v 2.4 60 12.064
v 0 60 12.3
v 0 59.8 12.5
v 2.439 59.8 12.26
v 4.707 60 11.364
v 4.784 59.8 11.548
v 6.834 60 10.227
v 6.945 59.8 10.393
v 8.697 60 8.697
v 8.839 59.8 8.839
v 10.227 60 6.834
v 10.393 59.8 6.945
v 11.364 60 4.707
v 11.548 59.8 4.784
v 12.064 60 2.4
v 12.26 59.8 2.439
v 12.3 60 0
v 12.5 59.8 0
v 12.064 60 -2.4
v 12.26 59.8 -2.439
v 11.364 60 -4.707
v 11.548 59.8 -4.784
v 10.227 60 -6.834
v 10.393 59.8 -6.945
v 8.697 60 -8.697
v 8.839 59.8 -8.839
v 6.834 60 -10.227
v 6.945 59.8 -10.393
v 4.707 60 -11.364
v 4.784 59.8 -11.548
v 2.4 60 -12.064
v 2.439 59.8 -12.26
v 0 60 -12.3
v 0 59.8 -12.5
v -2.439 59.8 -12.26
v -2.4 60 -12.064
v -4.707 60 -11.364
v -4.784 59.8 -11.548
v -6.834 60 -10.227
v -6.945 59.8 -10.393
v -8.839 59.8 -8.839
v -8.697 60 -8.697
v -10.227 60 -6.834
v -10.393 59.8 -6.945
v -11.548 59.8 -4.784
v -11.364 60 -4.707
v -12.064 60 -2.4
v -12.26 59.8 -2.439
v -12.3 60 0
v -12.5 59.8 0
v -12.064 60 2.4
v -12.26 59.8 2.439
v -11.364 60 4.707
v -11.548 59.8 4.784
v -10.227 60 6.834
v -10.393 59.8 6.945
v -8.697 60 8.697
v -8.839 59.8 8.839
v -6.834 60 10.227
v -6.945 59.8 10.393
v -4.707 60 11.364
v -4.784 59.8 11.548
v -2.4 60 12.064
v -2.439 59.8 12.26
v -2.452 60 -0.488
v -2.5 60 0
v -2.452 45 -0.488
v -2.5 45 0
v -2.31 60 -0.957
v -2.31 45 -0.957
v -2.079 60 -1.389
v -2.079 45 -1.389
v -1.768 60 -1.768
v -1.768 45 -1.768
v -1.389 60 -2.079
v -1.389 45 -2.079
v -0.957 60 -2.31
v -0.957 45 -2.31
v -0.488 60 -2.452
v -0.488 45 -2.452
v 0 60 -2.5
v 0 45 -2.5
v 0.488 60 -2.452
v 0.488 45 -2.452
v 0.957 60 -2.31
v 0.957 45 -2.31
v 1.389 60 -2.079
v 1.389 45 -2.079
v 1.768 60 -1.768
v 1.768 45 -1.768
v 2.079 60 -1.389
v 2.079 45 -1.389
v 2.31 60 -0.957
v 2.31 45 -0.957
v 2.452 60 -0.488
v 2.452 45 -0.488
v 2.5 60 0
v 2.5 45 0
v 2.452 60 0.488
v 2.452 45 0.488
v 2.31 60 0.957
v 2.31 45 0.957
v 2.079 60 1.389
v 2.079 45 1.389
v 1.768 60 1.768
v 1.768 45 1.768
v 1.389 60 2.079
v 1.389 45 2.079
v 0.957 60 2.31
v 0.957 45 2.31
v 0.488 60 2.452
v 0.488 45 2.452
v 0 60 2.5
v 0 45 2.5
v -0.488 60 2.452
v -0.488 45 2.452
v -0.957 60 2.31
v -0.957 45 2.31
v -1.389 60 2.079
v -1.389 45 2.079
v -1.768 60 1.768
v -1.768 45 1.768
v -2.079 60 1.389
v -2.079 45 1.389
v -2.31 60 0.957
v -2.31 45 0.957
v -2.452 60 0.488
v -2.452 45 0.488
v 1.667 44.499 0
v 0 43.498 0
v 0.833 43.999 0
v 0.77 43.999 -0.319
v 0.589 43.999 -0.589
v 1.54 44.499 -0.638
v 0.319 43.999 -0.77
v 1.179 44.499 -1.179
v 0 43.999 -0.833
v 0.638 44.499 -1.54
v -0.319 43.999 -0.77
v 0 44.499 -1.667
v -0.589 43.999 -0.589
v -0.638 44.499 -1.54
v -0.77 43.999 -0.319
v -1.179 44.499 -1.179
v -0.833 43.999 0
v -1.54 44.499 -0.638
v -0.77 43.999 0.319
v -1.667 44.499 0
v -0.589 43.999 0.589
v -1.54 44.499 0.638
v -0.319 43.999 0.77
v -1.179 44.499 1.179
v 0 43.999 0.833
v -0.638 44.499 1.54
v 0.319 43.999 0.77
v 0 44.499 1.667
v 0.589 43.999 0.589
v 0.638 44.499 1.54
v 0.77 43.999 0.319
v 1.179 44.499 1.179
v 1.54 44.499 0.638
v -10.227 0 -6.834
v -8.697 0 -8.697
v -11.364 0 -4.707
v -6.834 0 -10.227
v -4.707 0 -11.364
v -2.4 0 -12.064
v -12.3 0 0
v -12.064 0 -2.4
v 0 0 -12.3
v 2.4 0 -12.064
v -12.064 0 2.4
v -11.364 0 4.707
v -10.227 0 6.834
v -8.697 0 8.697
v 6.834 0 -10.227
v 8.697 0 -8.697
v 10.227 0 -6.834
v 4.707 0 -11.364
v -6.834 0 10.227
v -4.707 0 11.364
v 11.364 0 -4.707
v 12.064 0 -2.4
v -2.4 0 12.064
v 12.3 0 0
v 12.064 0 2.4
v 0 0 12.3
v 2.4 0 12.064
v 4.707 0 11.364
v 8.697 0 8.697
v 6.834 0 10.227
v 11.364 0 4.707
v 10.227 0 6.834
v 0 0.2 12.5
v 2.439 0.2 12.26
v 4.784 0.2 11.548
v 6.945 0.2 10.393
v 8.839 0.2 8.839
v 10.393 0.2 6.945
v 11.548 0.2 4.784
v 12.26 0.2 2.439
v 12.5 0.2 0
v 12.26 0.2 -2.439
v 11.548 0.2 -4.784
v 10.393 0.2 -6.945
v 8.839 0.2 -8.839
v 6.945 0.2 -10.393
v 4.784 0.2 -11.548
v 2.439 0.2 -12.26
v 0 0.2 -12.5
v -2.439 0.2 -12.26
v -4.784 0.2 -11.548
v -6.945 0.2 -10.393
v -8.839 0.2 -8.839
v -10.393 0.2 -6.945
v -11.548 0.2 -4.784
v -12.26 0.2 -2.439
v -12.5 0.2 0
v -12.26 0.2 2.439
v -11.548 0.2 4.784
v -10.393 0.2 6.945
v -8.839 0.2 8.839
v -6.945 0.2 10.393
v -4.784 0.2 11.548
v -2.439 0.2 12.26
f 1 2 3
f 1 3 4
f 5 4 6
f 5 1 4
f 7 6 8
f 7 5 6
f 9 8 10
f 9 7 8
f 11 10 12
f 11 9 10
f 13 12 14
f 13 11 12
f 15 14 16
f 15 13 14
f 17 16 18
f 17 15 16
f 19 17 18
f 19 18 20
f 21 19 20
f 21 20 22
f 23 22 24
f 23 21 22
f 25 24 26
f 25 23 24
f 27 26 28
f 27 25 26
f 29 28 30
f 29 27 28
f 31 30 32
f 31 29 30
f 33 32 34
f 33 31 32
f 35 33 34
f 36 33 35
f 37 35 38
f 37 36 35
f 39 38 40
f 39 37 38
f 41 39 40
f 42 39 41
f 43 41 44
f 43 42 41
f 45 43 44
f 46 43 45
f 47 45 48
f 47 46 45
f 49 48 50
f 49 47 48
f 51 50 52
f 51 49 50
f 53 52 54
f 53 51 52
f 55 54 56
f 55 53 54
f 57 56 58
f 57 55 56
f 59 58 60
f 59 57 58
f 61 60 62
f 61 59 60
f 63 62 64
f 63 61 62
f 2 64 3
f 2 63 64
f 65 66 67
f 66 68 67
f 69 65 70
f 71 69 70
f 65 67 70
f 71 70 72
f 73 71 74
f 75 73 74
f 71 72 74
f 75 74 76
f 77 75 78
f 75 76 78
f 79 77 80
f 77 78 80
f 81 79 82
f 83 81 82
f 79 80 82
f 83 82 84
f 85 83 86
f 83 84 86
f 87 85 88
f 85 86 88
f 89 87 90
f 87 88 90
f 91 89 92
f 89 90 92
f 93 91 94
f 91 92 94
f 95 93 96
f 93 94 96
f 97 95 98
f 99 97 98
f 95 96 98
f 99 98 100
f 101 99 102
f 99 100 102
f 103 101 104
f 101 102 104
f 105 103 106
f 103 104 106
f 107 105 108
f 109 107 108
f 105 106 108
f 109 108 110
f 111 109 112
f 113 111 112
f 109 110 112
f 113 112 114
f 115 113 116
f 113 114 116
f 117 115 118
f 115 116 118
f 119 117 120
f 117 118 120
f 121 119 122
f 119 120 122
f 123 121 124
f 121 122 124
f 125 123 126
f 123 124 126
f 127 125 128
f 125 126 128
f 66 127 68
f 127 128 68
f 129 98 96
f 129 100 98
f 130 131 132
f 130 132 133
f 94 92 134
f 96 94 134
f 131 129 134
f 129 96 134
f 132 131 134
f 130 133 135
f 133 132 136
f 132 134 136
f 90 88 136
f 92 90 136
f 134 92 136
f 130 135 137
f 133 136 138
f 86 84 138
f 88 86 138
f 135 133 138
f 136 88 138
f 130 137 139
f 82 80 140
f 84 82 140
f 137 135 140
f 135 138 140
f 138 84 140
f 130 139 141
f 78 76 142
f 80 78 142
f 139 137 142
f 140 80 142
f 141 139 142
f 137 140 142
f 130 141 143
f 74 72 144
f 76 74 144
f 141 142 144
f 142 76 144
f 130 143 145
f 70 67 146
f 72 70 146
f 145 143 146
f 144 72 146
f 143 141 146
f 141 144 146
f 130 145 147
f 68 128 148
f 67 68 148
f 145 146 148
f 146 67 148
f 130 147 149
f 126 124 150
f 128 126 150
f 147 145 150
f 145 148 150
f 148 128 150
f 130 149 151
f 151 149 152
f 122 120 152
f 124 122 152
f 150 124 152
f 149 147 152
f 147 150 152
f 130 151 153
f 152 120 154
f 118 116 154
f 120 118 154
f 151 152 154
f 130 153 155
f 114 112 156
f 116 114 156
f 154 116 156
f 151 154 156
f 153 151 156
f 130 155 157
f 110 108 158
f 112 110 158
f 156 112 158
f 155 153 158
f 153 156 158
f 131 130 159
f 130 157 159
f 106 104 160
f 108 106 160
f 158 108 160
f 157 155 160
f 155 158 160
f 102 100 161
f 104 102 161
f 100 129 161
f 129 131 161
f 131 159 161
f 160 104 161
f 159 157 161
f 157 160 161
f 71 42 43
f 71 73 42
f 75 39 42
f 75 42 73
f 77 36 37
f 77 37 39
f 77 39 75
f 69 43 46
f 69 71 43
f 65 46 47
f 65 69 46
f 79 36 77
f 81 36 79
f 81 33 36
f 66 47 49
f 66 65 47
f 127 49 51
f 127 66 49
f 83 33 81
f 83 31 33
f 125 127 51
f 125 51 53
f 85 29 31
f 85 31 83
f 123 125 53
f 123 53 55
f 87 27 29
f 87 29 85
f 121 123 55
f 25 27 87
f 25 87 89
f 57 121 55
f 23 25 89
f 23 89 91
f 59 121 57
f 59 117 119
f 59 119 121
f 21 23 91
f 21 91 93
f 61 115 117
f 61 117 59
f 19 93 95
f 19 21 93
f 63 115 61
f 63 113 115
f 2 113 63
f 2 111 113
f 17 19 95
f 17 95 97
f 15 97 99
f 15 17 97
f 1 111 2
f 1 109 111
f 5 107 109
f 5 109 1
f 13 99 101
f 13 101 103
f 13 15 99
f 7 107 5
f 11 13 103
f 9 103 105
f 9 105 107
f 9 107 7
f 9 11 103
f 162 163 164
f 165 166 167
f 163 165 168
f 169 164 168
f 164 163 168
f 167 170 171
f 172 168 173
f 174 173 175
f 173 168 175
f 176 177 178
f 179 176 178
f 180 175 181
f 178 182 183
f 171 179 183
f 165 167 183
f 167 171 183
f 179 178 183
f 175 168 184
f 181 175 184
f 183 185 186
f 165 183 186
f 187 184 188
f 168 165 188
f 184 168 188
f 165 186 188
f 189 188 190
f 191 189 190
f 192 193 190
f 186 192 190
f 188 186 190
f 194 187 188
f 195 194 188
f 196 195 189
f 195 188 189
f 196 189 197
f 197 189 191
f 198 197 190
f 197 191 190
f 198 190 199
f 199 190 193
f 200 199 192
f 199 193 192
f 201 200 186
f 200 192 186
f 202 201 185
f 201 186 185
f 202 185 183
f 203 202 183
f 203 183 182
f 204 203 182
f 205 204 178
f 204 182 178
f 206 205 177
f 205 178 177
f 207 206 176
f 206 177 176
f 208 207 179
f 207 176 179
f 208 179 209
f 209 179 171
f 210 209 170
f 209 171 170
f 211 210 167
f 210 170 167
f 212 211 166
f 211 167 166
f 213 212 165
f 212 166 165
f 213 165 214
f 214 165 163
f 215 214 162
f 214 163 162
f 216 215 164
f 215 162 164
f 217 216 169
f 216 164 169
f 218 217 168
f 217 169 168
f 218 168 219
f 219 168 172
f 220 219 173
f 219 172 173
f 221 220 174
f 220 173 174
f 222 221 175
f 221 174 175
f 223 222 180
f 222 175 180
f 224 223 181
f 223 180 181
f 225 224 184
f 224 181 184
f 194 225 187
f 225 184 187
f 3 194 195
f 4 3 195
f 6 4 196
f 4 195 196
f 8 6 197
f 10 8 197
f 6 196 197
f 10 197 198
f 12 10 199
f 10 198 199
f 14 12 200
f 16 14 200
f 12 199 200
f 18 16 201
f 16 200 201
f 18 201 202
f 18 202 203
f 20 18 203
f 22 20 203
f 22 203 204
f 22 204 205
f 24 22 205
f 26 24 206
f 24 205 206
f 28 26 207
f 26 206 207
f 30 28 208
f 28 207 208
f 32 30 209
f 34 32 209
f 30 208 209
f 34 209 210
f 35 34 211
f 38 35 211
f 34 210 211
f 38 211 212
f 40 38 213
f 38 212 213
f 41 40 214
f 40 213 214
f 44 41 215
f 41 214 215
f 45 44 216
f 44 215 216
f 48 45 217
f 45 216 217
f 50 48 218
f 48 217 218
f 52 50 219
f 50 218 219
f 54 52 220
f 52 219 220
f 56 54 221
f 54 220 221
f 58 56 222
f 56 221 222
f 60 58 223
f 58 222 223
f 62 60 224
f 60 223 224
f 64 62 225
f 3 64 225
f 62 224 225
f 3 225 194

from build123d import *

# Parameters (mm, degrees)
SKETCH_1_R             = 12.5
EXTRUDE_1_DEPTH        = 60
HOLE_WIZARD_M6_1_D     = 5
HOLE_WIZARD_M6_1_DEPTH = 15
HOLE_WIZARD_M6_1_TIP   = 1.502151548
CHAMFER_1_SIZE         = 0.2


with BuildPart() as part:
    # 草图1 → 凸台-拉伸1 (new body)
    with BuildSketch(Plane(origin=(0, 0, 0), x_dir=(1, 0, 0), z_dir=(0, 1, 0))):
        with Locations(Location((0, 0, 0), (0, 0, 270))):
            Circle(SKETCH_1_R)
    extrude(amount=EXTRUDE_1_DEPTH)

    # M6 螺纹孔1
    with Locations(Plane(origin=(0, 60, 0), x_dir=(1, 0, 0), z_dir=(0, 1, 0))):
        with Locations((0, 0)):
            Hole(HOLE_WIZARD_M6_1_D / 2, depth=HOLE_WIZARD_M6_1_DEPTH)
            with Locations((0, 0, -(HOLE_WIZARD_M6_1_DEPTH + HOLE_WIZARD_M6_1_TIP / 2))):  # 118° drill point
                Cone(0, HOLE_WIZARD_M6_1_D / 2, HOLE_WIZARD_M6_1_TIP, mode=Mode.SUBTRACT)

    # 倒角1
    chamfer_1_edges = [part.edges().sort_by_distance(p)[0] for p in [
        (0, 0, -12.5),
        (0, 60, -12.5),
    ]]
    chamfer(chamfer_1_edges, length=CHAMFER_1_SIZE)


solid = part.part
